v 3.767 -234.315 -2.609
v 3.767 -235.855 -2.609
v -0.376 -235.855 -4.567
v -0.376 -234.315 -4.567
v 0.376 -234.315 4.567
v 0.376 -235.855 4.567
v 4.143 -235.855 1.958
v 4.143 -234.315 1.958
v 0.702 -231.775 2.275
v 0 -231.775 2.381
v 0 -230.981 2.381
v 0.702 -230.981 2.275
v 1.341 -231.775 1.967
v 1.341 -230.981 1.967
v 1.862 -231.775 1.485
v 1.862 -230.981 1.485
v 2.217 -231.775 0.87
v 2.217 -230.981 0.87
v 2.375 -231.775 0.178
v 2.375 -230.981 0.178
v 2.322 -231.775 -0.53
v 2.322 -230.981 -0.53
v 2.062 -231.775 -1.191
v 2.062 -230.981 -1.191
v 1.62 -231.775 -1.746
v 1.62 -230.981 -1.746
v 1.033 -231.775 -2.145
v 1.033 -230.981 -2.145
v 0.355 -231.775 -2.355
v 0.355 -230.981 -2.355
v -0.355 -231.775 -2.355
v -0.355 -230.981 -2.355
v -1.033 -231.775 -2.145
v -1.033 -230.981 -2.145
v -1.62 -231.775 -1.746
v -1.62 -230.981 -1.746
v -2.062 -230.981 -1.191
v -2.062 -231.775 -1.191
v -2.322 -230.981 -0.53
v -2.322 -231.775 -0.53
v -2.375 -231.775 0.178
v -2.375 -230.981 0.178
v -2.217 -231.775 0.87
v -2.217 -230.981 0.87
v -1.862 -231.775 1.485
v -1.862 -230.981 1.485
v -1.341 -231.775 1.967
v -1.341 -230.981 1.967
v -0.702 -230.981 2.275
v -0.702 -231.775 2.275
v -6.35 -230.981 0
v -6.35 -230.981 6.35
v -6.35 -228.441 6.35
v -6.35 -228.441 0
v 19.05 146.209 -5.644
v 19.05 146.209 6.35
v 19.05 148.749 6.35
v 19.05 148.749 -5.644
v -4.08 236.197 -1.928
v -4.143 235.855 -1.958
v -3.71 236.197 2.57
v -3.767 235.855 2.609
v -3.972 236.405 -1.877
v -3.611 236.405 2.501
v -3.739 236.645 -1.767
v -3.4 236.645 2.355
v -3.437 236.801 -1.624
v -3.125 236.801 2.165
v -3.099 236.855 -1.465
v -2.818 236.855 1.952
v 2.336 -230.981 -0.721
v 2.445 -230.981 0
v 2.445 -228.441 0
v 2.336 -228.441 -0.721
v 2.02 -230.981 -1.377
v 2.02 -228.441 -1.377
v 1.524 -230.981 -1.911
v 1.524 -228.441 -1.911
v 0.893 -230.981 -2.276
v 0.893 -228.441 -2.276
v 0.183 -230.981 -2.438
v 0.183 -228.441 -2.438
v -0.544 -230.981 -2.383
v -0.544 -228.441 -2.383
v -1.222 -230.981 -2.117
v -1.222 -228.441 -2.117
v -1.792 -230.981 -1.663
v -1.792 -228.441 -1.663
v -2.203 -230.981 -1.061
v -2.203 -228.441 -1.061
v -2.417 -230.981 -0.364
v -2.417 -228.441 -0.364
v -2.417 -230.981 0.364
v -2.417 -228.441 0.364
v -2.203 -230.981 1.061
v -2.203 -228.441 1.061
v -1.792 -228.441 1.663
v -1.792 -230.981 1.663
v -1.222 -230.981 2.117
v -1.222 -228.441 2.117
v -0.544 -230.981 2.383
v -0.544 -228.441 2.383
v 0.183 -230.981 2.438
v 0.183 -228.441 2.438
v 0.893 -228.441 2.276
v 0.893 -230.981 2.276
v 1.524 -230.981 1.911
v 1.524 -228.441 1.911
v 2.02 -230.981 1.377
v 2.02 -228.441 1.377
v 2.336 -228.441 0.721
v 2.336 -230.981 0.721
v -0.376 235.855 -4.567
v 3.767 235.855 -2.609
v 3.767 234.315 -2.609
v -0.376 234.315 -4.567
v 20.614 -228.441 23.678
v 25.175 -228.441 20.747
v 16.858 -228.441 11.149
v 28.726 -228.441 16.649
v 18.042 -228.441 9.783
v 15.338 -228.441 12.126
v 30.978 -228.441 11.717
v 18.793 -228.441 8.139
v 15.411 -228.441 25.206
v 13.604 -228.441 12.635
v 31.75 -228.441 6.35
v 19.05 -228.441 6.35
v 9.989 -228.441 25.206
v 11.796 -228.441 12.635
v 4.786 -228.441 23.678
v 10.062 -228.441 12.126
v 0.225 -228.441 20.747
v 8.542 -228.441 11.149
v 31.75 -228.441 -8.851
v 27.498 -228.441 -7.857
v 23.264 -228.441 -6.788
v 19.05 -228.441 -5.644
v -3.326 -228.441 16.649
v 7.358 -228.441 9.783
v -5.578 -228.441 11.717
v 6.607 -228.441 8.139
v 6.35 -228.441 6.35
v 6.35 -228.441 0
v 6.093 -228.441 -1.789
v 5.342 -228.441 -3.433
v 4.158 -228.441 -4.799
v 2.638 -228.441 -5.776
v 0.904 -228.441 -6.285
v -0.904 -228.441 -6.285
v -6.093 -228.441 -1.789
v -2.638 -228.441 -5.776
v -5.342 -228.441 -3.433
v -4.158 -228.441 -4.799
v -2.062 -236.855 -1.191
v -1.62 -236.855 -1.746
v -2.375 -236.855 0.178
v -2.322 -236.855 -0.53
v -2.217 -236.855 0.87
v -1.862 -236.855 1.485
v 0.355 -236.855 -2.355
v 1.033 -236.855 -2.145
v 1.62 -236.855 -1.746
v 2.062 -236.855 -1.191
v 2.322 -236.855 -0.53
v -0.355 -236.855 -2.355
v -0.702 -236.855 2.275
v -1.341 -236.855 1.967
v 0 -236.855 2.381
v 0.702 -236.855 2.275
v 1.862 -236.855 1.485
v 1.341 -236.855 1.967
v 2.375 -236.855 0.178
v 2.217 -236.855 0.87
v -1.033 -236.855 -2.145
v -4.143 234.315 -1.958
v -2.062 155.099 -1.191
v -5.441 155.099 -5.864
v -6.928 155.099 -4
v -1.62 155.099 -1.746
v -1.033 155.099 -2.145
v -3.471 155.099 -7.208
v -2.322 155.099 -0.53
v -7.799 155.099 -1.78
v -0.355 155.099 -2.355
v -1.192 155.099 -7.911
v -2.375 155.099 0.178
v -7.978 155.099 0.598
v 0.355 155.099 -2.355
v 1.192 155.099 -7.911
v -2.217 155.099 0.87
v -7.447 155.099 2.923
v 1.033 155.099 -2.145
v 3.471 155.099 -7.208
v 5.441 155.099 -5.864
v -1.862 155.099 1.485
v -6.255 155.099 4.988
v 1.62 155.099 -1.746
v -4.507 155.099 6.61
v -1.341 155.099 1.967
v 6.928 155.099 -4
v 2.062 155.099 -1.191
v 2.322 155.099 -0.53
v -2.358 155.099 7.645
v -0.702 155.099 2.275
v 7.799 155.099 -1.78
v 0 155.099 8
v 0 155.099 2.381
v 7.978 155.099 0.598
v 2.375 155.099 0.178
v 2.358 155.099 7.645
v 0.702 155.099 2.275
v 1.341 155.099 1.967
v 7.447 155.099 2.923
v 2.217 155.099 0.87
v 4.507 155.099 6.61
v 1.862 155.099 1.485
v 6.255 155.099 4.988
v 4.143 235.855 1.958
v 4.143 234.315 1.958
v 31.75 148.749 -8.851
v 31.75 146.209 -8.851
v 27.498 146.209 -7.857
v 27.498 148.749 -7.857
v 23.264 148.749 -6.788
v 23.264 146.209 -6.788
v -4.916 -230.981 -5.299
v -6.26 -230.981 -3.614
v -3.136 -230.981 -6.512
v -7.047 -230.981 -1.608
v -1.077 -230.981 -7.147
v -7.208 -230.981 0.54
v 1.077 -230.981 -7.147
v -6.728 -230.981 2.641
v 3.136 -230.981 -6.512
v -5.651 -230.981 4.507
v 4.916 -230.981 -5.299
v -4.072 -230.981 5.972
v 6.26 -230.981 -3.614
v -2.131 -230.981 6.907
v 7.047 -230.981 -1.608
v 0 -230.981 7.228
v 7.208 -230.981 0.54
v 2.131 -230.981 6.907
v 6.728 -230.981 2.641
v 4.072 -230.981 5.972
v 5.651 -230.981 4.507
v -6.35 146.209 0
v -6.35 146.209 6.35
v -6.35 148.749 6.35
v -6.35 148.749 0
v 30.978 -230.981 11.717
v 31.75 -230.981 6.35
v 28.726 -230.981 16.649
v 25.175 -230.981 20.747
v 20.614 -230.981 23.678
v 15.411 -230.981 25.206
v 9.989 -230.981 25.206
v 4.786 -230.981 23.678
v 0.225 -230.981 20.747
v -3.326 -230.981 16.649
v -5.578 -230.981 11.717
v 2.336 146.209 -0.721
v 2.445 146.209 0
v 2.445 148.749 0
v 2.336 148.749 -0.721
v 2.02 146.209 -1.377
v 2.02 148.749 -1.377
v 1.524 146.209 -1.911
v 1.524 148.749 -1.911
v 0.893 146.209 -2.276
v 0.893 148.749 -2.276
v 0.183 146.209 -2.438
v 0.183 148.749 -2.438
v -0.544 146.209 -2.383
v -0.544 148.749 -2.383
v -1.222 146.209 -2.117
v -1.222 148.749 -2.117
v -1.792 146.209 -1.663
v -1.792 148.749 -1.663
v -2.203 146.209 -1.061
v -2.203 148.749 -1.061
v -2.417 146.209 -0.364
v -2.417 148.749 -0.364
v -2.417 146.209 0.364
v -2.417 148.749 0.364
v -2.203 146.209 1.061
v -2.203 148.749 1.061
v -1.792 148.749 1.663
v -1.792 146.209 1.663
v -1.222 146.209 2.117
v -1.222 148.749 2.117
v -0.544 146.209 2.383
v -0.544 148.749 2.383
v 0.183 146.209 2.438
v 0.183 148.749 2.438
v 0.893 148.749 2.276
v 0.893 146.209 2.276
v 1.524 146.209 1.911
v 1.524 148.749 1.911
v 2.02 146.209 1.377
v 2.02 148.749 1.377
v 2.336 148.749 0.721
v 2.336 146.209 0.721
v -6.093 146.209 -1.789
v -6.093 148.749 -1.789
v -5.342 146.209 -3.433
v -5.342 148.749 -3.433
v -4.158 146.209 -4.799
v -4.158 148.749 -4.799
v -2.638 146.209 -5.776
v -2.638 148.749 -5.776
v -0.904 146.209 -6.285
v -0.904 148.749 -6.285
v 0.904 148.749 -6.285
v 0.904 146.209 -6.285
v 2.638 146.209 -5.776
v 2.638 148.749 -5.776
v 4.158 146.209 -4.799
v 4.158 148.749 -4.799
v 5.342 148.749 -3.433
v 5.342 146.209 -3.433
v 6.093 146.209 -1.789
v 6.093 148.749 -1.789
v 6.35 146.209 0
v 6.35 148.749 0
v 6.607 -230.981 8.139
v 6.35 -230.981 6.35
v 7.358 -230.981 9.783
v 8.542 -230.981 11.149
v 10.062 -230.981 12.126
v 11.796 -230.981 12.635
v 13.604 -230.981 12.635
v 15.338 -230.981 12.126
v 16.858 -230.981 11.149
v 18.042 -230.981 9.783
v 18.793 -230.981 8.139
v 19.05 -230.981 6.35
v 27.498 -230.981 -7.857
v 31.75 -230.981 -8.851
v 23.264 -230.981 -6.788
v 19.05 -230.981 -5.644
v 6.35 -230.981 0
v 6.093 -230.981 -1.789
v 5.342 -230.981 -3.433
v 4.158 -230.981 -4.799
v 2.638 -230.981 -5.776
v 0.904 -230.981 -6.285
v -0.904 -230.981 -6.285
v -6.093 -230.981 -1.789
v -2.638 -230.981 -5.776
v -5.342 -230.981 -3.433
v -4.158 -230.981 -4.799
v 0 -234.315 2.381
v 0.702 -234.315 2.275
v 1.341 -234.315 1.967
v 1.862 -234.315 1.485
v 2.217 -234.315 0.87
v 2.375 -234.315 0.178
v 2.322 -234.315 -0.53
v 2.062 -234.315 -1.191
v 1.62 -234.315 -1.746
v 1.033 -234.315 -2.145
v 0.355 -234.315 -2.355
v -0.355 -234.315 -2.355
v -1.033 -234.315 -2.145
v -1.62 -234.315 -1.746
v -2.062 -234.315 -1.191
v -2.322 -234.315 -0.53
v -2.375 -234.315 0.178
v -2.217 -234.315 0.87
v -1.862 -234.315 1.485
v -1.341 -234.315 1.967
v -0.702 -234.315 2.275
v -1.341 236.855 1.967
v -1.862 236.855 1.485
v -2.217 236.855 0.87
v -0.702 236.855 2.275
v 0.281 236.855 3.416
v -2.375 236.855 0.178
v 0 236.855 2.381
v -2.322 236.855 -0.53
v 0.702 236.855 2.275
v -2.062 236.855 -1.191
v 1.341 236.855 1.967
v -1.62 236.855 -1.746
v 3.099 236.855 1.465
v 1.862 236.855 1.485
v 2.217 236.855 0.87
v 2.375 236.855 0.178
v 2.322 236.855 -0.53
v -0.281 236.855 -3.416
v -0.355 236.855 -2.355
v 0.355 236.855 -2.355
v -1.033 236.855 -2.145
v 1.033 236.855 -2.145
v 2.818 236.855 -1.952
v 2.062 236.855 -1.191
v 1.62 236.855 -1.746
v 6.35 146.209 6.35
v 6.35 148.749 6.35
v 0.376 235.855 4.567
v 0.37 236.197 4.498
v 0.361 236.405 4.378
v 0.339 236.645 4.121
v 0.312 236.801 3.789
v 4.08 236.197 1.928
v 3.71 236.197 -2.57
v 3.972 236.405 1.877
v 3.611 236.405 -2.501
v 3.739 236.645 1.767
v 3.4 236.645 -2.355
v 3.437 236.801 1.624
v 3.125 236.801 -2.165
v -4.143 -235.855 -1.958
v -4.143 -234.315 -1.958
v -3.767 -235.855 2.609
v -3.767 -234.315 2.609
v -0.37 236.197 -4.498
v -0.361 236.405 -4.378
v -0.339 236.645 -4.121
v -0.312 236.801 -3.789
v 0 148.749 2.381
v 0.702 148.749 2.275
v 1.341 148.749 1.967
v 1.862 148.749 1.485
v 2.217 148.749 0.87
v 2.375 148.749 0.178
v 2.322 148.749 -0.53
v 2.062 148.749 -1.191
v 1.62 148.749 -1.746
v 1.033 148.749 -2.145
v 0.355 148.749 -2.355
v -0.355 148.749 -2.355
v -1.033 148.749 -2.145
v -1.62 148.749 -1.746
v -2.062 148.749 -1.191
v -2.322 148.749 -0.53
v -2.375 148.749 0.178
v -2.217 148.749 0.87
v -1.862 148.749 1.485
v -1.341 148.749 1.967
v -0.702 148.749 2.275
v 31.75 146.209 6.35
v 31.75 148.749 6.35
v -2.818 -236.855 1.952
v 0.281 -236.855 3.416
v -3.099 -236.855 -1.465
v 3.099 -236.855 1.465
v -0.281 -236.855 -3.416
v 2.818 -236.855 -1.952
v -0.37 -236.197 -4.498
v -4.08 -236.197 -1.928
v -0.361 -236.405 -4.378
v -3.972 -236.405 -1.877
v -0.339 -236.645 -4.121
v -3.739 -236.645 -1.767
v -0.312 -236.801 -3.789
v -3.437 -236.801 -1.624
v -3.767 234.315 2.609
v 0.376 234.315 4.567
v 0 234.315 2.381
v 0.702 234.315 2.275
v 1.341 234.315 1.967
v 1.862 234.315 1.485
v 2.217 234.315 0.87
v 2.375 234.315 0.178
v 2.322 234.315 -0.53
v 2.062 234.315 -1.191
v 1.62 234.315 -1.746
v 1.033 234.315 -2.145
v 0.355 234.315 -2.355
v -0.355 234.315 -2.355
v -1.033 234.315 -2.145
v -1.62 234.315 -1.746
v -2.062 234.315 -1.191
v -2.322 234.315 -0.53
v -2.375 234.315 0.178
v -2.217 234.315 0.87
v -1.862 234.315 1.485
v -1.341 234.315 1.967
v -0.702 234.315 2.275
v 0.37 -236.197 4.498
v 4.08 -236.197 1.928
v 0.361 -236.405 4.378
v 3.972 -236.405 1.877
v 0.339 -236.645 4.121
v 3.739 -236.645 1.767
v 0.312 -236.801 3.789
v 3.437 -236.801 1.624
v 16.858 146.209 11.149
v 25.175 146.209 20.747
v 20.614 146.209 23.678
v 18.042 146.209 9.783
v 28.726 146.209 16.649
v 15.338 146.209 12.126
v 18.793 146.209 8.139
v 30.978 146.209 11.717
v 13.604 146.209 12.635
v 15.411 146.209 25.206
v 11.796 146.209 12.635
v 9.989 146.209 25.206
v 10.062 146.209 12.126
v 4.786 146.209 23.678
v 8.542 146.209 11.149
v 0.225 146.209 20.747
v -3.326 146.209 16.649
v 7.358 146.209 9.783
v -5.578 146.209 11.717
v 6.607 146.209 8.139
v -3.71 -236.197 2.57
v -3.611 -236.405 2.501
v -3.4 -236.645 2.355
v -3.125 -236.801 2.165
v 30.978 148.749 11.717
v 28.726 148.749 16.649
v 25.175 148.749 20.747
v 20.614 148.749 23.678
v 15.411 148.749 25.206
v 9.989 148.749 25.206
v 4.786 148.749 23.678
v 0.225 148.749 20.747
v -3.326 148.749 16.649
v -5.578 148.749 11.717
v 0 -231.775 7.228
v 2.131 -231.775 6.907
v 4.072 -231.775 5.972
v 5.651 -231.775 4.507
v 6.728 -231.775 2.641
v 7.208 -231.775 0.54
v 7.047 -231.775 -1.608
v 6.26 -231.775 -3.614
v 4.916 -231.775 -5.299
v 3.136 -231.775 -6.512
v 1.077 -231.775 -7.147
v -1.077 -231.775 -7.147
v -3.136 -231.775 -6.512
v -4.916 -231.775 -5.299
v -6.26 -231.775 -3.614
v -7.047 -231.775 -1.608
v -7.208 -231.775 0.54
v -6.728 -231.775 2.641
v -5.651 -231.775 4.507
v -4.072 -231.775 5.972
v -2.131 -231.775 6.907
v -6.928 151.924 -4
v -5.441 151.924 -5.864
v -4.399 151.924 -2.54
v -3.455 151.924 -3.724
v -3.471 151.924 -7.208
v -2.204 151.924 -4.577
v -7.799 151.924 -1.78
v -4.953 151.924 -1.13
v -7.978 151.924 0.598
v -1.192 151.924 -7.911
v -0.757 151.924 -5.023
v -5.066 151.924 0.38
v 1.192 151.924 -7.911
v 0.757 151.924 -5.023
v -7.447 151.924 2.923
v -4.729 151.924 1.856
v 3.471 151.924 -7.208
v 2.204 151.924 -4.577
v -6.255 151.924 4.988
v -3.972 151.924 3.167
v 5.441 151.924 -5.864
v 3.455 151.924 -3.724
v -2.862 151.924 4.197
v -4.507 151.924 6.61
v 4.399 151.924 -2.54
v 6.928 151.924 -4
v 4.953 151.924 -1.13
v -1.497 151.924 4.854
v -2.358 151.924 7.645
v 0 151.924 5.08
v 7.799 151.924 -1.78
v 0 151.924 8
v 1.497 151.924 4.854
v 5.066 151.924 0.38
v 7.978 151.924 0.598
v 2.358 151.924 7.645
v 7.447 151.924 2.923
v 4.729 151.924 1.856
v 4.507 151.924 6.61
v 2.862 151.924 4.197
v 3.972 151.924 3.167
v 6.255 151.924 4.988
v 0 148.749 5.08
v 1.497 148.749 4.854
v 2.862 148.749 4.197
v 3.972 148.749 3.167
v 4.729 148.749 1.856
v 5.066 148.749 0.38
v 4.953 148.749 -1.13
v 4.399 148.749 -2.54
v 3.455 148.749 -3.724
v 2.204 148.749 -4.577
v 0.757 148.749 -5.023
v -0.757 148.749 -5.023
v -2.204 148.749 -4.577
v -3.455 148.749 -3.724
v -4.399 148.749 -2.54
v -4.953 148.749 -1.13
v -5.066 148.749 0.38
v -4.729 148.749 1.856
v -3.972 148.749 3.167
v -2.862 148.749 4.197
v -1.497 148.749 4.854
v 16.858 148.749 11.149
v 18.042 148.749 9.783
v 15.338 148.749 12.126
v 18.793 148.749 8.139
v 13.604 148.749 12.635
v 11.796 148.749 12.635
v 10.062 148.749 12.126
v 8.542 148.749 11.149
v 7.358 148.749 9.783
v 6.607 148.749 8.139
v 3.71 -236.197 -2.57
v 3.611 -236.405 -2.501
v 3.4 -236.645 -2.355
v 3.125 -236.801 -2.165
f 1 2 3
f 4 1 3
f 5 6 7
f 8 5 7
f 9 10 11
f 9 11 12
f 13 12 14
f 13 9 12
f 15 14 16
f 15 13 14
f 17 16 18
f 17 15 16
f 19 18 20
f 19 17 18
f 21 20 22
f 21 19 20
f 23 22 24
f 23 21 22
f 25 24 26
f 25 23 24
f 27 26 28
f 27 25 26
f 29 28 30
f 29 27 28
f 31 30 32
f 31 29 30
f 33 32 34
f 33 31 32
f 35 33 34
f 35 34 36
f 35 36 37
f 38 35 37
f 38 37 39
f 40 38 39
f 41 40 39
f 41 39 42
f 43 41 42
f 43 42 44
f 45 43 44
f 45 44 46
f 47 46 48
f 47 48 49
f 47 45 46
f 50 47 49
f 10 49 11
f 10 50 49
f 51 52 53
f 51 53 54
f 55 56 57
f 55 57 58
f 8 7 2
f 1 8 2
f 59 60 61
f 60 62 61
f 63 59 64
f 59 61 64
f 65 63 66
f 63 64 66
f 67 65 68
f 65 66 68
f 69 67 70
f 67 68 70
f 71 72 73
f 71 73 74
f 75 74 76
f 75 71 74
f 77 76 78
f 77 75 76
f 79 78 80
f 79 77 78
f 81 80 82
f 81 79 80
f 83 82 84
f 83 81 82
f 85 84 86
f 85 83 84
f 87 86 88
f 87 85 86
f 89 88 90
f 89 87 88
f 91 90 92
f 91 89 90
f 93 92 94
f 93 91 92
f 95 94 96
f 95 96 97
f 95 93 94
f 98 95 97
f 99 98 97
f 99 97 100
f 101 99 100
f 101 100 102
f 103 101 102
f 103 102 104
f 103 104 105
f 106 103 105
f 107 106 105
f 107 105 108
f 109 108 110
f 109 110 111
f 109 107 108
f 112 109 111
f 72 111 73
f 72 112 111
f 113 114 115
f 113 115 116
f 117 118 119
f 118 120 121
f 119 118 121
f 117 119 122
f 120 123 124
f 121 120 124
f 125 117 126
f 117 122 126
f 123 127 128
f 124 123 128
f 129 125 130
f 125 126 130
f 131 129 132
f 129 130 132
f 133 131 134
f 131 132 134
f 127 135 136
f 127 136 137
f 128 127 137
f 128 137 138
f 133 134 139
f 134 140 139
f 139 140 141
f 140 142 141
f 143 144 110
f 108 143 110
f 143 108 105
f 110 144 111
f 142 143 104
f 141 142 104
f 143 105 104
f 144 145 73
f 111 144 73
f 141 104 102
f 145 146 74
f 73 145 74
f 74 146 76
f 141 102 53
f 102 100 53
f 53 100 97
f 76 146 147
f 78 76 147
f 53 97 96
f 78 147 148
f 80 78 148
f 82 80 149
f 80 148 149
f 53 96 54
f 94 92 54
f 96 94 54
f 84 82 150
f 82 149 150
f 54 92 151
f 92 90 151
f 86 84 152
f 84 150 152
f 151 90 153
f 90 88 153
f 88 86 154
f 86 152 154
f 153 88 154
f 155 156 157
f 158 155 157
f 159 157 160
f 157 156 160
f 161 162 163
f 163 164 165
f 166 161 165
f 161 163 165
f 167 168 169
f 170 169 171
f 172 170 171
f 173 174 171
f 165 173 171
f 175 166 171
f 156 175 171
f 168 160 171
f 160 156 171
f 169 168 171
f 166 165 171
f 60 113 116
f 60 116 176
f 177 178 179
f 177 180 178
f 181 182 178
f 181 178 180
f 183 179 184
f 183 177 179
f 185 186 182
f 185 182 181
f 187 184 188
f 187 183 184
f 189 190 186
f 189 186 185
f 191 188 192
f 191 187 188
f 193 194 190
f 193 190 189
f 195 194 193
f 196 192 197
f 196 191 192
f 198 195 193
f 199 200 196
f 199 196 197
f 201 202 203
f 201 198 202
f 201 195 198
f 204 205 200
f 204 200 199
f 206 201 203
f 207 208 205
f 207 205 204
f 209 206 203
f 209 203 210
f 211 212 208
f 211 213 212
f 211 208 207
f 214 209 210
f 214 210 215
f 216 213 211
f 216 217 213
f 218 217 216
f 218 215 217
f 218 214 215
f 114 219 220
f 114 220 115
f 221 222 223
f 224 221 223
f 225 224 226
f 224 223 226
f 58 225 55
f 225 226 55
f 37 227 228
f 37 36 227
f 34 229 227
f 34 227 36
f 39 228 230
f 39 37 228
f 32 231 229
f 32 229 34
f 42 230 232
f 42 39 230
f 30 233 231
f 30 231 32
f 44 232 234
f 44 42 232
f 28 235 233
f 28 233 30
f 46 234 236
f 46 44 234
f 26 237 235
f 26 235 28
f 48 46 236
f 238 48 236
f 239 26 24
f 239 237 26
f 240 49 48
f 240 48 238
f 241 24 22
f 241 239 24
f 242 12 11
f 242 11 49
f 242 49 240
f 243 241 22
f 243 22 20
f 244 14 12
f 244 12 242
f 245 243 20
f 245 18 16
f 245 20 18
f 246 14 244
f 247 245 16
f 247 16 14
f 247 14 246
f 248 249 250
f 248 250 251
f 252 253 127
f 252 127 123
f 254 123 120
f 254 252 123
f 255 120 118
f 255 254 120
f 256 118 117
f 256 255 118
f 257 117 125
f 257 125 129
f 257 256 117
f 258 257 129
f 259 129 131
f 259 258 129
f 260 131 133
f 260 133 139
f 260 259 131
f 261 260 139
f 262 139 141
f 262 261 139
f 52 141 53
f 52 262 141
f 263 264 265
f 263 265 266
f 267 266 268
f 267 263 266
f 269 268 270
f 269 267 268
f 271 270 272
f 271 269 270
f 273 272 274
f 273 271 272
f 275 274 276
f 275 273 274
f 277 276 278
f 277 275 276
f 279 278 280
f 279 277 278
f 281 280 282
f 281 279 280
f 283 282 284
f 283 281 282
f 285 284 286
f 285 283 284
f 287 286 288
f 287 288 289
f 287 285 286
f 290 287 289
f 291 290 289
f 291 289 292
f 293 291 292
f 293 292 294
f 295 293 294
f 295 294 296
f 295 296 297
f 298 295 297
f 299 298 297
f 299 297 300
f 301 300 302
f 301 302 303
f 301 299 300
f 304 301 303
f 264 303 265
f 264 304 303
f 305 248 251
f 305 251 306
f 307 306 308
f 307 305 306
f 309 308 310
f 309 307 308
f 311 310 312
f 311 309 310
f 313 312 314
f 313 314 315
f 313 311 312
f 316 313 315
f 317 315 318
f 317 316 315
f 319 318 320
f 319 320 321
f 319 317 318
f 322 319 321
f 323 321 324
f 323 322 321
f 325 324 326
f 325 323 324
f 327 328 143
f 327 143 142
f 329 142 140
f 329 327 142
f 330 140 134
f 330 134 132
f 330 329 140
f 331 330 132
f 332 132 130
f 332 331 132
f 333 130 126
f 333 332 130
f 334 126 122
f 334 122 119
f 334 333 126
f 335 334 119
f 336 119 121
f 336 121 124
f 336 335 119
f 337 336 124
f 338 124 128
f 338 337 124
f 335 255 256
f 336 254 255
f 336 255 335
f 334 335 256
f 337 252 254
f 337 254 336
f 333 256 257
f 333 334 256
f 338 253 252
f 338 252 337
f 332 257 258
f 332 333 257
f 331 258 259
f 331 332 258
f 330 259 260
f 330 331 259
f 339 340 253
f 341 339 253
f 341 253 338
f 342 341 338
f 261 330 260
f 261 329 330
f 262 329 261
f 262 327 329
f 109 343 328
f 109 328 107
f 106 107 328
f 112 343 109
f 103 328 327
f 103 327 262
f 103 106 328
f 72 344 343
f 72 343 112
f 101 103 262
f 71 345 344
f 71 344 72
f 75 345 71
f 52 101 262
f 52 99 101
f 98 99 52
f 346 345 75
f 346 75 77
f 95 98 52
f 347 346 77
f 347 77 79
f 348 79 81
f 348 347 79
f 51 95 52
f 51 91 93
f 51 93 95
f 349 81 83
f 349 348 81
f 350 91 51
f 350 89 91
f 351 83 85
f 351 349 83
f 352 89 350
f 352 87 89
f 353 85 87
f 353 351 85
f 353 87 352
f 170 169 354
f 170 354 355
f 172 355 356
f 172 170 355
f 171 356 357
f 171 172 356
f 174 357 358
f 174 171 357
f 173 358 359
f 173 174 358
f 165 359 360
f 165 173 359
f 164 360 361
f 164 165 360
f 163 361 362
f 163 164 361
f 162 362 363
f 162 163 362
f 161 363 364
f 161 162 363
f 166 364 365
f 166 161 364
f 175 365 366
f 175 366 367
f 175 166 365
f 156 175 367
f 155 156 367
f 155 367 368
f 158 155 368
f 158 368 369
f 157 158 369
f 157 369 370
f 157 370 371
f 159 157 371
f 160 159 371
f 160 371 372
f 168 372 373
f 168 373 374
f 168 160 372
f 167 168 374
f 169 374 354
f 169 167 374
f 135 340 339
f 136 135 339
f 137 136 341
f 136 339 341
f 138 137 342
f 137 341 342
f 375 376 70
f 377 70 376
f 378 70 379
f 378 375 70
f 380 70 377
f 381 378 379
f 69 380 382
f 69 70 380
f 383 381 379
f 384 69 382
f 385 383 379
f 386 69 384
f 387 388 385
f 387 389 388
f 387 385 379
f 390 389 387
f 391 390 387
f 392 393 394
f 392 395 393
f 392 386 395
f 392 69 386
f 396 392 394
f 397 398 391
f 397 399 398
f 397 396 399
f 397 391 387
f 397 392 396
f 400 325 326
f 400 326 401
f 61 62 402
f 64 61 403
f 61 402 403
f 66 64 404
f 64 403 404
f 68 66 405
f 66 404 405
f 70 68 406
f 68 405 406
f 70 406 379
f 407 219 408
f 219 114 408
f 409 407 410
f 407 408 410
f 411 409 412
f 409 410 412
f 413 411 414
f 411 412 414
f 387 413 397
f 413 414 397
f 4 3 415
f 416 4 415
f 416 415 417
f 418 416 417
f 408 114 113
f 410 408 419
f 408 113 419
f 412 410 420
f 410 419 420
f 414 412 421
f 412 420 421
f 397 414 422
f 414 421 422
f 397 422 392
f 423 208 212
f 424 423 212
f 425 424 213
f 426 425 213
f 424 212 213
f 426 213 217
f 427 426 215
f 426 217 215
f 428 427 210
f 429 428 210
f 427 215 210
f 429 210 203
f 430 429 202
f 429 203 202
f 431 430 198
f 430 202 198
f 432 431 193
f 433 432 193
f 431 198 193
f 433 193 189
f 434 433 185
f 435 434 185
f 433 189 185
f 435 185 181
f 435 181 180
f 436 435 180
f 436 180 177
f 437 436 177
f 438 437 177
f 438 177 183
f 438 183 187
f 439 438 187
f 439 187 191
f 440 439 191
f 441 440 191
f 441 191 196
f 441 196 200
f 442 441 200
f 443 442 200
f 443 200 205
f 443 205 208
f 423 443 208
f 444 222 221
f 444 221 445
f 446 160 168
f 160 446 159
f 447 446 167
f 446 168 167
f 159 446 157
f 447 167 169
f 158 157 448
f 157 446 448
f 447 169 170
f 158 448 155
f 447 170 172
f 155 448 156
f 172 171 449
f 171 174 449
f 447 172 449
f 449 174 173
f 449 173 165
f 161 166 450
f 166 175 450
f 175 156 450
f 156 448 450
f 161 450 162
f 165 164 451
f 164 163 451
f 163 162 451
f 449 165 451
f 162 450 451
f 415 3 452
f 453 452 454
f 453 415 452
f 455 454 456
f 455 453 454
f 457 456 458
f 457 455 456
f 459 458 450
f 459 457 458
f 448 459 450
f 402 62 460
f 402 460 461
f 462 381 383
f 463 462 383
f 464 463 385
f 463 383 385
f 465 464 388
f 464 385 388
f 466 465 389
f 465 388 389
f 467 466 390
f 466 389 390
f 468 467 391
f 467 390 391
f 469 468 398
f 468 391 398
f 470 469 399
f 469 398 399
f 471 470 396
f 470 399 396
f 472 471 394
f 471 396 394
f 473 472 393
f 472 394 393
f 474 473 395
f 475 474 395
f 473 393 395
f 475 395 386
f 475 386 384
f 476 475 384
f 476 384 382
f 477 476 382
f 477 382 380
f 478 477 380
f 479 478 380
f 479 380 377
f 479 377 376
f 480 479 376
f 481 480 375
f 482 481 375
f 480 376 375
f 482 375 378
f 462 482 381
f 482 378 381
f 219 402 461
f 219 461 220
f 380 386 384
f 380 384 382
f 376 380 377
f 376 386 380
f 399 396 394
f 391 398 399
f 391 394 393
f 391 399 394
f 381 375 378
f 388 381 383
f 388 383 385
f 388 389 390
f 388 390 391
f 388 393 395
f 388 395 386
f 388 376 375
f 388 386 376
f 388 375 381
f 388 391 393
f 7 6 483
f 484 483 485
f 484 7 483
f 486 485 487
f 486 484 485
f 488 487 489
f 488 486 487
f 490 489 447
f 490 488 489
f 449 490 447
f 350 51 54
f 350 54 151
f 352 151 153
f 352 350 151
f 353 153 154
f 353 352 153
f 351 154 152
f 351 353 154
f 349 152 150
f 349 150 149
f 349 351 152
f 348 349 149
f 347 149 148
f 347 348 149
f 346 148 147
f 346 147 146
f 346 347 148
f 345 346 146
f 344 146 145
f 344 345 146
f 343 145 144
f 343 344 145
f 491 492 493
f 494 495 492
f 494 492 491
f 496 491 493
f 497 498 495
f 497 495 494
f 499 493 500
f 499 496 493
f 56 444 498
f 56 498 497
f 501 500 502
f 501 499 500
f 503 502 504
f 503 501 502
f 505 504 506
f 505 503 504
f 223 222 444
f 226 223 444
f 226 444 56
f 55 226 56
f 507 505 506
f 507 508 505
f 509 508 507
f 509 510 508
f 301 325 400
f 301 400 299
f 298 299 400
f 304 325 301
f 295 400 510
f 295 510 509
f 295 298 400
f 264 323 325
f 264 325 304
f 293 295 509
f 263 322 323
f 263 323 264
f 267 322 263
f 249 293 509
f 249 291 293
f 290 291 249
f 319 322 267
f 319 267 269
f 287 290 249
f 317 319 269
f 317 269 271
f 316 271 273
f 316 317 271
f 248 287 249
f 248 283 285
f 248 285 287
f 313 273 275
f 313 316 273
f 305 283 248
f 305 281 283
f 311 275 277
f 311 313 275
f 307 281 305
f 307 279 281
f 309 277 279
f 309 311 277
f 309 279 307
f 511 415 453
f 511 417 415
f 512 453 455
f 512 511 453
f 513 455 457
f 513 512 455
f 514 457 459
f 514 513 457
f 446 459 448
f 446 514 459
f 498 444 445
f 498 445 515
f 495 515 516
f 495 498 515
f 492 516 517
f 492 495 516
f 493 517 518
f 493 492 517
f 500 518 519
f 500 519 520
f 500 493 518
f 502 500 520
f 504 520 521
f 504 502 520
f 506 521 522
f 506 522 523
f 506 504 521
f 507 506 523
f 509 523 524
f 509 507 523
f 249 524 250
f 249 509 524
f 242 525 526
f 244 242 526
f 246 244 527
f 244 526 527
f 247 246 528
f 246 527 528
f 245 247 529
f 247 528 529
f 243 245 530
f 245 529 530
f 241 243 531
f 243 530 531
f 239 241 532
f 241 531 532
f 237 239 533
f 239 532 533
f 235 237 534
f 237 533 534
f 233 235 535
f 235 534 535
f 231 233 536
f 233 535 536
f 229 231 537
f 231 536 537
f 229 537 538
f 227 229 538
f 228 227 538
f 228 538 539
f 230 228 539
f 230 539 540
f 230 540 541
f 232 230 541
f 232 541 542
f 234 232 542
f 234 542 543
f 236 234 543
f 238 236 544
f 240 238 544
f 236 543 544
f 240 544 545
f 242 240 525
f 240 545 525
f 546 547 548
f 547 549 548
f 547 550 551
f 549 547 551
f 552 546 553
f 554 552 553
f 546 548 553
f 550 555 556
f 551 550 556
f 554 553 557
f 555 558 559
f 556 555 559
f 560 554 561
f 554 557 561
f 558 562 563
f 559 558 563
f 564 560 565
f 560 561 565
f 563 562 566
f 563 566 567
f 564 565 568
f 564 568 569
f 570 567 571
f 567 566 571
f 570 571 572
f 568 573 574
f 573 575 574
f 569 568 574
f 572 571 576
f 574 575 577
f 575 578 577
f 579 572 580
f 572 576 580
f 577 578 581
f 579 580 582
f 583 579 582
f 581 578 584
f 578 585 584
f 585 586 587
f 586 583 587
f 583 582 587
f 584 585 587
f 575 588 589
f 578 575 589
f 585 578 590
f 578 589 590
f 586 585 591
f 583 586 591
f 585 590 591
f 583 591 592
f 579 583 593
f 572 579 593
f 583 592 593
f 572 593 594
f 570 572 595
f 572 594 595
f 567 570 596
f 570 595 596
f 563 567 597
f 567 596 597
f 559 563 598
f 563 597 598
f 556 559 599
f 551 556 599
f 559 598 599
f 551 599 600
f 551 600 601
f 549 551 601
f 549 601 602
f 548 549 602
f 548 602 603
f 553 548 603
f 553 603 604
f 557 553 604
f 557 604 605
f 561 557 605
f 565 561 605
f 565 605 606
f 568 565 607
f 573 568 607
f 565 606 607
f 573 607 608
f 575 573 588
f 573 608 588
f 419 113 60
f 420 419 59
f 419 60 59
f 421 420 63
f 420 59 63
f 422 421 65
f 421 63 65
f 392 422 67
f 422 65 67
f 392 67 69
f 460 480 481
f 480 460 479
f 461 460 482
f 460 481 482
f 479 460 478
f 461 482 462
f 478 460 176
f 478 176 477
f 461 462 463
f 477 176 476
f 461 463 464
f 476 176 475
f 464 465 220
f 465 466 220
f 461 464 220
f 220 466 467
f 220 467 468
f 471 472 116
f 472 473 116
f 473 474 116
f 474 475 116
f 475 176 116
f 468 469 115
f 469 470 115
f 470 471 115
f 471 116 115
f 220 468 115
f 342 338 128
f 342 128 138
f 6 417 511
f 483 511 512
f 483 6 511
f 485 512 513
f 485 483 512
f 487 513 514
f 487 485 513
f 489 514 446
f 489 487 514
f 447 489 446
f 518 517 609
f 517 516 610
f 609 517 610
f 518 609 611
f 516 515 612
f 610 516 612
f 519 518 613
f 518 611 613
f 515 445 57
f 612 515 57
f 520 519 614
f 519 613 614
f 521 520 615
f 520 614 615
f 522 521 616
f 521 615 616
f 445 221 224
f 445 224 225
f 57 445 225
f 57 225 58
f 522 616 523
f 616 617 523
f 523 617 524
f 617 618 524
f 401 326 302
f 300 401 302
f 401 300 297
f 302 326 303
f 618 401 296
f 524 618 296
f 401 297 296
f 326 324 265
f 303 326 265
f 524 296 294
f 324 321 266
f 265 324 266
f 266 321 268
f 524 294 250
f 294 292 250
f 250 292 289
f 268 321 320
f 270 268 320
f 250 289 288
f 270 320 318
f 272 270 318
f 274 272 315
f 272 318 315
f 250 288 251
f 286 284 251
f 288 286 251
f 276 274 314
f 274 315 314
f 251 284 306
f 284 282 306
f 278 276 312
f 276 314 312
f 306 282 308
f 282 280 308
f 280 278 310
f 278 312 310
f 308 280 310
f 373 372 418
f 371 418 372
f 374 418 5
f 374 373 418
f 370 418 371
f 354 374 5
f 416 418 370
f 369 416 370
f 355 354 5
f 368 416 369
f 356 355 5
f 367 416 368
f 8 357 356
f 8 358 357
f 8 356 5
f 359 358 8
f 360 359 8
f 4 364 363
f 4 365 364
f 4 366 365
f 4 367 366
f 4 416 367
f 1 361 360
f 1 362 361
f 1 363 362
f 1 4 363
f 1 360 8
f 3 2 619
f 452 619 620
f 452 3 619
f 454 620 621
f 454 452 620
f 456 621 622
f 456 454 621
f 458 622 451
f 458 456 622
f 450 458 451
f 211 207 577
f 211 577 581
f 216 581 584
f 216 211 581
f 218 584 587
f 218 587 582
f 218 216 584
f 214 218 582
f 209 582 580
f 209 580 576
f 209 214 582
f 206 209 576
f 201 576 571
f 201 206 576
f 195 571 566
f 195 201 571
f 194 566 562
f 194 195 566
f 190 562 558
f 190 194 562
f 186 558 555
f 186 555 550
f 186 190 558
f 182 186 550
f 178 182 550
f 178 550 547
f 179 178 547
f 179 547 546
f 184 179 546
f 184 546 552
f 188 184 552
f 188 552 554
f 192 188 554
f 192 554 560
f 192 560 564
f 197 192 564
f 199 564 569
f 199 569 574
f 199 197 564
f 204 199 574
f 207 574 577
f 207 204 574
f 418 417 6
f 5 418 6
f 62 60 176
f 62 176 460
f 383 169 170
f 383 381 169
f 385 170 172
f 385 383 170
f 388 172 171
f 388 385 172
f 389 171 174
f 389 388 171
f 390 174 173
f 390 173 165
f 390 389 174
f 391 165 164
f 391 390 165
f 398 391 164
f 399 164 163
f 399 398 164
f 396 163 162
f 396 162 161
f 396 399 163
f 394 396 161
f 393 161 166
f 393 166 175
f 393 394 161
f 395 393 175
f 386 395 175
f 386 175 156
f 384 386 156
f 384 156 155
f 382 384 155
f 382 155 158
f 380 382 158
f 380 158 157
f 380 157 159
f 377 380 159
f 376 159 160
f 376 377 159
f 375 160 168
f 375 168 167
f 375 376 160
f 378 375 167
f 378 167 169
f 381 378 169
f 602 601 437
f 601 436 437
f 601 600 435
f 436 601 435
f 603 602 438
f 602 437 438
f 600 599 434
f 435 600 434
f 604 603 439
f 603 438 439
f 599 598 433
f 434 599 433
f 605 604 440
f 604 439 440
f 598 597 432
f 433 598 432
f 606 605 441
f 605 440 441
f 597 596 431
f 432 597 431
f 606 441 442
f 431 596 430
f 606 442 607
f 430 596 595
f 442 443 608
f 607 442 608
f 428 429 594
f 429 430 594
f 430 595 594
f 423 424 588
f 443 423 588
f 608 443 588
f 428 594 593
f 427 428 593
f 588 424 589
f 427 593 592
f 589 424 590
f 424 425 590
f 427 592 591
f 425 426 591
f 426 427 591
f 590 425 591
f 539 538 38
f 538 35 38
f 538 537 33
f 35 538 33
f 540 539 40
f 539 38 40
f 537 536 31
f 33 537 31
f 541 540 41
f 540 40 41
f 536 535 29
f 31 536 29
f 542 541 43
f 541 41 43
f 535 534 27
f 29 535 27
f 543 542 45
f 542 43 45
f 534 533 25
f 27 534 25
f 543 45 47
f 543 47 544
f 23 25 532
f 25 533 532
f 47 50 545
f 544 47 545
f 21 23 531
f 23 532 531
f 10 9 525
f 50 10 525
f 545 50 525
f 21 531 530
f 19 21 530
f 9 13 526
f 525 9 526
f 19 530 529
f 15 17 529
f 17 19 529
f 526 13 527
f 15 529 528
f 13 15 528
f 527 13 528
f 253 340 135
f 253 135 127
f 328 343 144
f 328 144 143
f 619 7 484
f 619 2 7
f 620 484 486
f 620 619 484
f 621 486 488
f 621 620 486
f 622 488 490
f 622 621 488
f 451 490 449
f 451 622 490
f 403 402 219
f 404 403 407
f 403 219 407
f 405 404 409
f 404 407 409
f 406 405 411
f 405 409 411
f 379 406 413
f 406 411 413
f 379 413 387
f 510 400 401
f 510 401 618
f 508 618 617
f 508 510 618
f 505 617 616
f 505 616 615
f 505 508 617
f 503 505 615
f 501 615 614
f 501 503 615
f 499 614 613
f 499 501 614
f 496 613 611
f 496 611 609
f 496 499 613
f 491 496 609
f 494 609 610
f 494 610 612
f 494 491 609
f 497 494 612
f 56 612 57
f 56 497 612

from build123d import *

# Parameters (mm, degrees)
SKETCH1_R              = 2.38125
BOSS_EXTRUDE1_DEPTH    = 236.855
SKETCH2_R              = 2.38125
BOSS_EXTRUDE2_DEPTH    = 2.54
FILLET1_R              = 1
SKETCH3_R              = 7.228116805
SKETCH3_R_2            = 2.38125
BOSS_EXTRUDE3_DEPTH    = 0.79375
SKETCH4_R              = 2.38125
BOSS_EXTRUDE4_DEPTH    = 2.54
CUT_EXTRUDE1_DEPTH     = 19.05
MOVE_START             = -230.98125
MOVE_FACE1_OUTLINE_R   = 2.44475
MOVE_FACE1_OUTLINE_R_2 = 2.38125
MOVE_FACE1_DEPTH       = 2.54
SKETCH7_R              = 5.08
SKETCH7_R_2            = 2.38125
BOSS_EXTRUDE6_DEPTH    = 3.175
BOSS_EXTRUDE7_START    = 3.175
SKETCH8_R              = 8
SKETCH8_R_2            = 2.38125
BOSS_EXTRUDE7_DEPTH    = 3.175


# Read off the part's stored shape, not the designer's step: Move Face1
with BuildPart() as part:
    # Sketch1 → Boss-Extrude1 (new, symmetric)
    with BuildSketch(Plane(origin=(0, 0, 0), x_dir=(1, 0, 0), z_dir=(0, 1, 0))):
        with Locations(Location((0, 0, 0), (0, 0, 270))):
            Circle(SKETCH1_R)
    extrude(amount=BOSS_EXTRUDE1_DEPTH, both=True)


with BuildPart() as body_2:
    # Sketch2 → Boss-Extrude2 (new body)
    with BuildSketch(Plane(origin=(0, 236.855, 0), x_dir=(1, 0, 0), z_dir=(0, 1, 0))):
        Polygon((3.767272711, 2.609398093), (-0.376168682, 4.567252917), (-4.143441392, 1.957854824), (-3.767272711, -2.609398093), (0.376168682, -4.567252917), (4.143441392, -1.957854824), align=None)
        with Locations(Location((0, 0, 0), (0, 0, 270))):
            Circle(SKETCH2_R, mode=Mode.SUBTRACT)
    extrude(amount=-BOSS_EXTRUDE2_DEPTH)

    # Fillet1
    fillet1_edges = [body_2.edges().sort_by_distance(p)[0] for p in [
        (2.259805037, 236.855, 3.26255387),
        (-1.695552014, 236.855, 3.588325505),
        (-3.955357051, 236.855, 0.325771635),
        (-2.259805037, 236.855, -3.26255387),
        (1.695552014, 236.855, -3.588325505),
        (3.955357051, 236.855, -0.325771635),
    ]]
    fillet(fillet1_edges, radius=FILLET1_R)


with BuildPart() as body_3:
    # Mirror1: mirrored copy
    add(body_2.part.mirror(Plane.ZX))


with BuildPart() as body_4:
    # Sketch3 → Boss-Extrude3 (new body)
    with BuildSketch(Plane(origin=(0, -231.775, 0), x_dir=(1, 0, 0), z_dir=(0, 1, 0))):
        with Locations(Location((0, 0, 0), (0, 0, 270))):
            Circle(SKETCH3_R)
        with Locations(Location((0, 0, 0), (0, 0, 270))):
            Circle(SKETCH3_R_2, mode=Mode.SUBTRACT)
    extrude(amount=BOSS_EXTRUDE3_DEPTH)


with BuildPart() as body_5:
    # Sketch4 → Boss-Extrude4 (new body)
    with BuildSketch(Plane(origin=(0, -230.98125, 0), x_dir=(1, 0, 0), z_dir=(0, 1, 0))):
        with BuildLine():
            Line((6.35, 0), (6.35, -6.35))
            ThreePointArc((6.35, -6.35), (12.7, -12.7), (19.05, -6.35))
            Line((19.05, -6.35), (19.05, 13.900226486))
            Line((19.05, 13.900226486), (31.75, 13.900226486))
            Line((31.75, 13.900226486), (31.75, -6.35))
            ThreePointArc((31.75, -6.35), (12.7, -25.4), (-6.35, -6.35))
            Line((-6.35, -6.35), (-6.35, 0))
            ThreePointArc((-6.35, 0), (0, 6.35), (6.35, 0))
        make_face()
        with Locations(Location((0, 0, 0), (0, 0, 270))):
            Circle(SKETCH4_R, mode=Mode.SUBTRACT)
    extrude(amount=BOSS_EXTRUDE4_DEPTH)

    # Sketch5 → Cut-Extrude1 (cut)
    with BuildSketch(Plane.XZ.offset(230.98125)):
        with BuildLine():
            Line((19.05, -5.644264501), (19.05, -13.900226486))
            Line((19.05, -13.900226486), (31.75, -13.900226486))
            Line((31.75, -13.900226486), (31.75, -8.851150591))
            ThreePointArc((31.75, -8.851150591), (25.378745016, -7.331882129), (19.05, -5.644264501))
        make_face()
    extrude(amount=-CUT_EXTRUDE1_DEPTH, mode=Mode.SUBTRACT)

    # Move Face1 outline → Move Face1 (cut)
    with BuildSketch(Plane(origin=(0, 0, 0), x_dir=(1, 0, 0), z_dir=(0, 1, 0)).offset(MOVE_START)):
        Circle(MOVE_FACE1_OUTLINE_R)
        Circle(MOVE_FACE1_OUTLINE_R_2, mode=Mode.SUBTRACT)
    extrude(amount=MOVE_FACE1_DEPTH, mode=Mode.SUBTRACT)


with BuildPart() as body_6:
    # Body-Move/Copy1: copy of body 5
    add(body_5.part.moved(Location((0, 377.19, 0))))


with BuildPart() as body_7:
    # Sketch7 → Boss-Extrude6 (new body)
    with BuildSketch(Plane(origin=(0, 148.74875, 0), x_dir=(1, 0, 0), z_dir=(0, 1, 0))):
        with Locations(Location((0, 0, 0), (0, 0, 270))):
            Circle(SKETCH7_R)
        with Locations(Location((0, 0, 0), (0, 0, 270))):
            Circle(SKETCH7_R_2, mode=Mode.SUBTRACT)
    extrude(amount=BOSS_EXTRUDE6_DEPTH)

    # Sketch8 → Boss-Extrude7 (add)
    with BuildSketch(Plane(origin=(0, 151.92375, 0), x_dir=(1, 0, 0), z_dir=(0, 1, 0)).offset(BOSS_EXTRUDE7_START)):
        with Locations(Location((0, 0, 0), (0, 0, 270))):
            Circle(SKETCH8_R)
        with Locations(Location((0, 0, 0), (0, 0, 270))):
            Circle(SKETCH8_R_2, mode=Mode.SUBTRACT)
    extrude(amount=-BOSS_EXTRUDE7_DEPTH)


solid = Compound([part.part, body_2.part, body_3.part, body_4.part, body_5.part, body_6.part, body_7.part])
